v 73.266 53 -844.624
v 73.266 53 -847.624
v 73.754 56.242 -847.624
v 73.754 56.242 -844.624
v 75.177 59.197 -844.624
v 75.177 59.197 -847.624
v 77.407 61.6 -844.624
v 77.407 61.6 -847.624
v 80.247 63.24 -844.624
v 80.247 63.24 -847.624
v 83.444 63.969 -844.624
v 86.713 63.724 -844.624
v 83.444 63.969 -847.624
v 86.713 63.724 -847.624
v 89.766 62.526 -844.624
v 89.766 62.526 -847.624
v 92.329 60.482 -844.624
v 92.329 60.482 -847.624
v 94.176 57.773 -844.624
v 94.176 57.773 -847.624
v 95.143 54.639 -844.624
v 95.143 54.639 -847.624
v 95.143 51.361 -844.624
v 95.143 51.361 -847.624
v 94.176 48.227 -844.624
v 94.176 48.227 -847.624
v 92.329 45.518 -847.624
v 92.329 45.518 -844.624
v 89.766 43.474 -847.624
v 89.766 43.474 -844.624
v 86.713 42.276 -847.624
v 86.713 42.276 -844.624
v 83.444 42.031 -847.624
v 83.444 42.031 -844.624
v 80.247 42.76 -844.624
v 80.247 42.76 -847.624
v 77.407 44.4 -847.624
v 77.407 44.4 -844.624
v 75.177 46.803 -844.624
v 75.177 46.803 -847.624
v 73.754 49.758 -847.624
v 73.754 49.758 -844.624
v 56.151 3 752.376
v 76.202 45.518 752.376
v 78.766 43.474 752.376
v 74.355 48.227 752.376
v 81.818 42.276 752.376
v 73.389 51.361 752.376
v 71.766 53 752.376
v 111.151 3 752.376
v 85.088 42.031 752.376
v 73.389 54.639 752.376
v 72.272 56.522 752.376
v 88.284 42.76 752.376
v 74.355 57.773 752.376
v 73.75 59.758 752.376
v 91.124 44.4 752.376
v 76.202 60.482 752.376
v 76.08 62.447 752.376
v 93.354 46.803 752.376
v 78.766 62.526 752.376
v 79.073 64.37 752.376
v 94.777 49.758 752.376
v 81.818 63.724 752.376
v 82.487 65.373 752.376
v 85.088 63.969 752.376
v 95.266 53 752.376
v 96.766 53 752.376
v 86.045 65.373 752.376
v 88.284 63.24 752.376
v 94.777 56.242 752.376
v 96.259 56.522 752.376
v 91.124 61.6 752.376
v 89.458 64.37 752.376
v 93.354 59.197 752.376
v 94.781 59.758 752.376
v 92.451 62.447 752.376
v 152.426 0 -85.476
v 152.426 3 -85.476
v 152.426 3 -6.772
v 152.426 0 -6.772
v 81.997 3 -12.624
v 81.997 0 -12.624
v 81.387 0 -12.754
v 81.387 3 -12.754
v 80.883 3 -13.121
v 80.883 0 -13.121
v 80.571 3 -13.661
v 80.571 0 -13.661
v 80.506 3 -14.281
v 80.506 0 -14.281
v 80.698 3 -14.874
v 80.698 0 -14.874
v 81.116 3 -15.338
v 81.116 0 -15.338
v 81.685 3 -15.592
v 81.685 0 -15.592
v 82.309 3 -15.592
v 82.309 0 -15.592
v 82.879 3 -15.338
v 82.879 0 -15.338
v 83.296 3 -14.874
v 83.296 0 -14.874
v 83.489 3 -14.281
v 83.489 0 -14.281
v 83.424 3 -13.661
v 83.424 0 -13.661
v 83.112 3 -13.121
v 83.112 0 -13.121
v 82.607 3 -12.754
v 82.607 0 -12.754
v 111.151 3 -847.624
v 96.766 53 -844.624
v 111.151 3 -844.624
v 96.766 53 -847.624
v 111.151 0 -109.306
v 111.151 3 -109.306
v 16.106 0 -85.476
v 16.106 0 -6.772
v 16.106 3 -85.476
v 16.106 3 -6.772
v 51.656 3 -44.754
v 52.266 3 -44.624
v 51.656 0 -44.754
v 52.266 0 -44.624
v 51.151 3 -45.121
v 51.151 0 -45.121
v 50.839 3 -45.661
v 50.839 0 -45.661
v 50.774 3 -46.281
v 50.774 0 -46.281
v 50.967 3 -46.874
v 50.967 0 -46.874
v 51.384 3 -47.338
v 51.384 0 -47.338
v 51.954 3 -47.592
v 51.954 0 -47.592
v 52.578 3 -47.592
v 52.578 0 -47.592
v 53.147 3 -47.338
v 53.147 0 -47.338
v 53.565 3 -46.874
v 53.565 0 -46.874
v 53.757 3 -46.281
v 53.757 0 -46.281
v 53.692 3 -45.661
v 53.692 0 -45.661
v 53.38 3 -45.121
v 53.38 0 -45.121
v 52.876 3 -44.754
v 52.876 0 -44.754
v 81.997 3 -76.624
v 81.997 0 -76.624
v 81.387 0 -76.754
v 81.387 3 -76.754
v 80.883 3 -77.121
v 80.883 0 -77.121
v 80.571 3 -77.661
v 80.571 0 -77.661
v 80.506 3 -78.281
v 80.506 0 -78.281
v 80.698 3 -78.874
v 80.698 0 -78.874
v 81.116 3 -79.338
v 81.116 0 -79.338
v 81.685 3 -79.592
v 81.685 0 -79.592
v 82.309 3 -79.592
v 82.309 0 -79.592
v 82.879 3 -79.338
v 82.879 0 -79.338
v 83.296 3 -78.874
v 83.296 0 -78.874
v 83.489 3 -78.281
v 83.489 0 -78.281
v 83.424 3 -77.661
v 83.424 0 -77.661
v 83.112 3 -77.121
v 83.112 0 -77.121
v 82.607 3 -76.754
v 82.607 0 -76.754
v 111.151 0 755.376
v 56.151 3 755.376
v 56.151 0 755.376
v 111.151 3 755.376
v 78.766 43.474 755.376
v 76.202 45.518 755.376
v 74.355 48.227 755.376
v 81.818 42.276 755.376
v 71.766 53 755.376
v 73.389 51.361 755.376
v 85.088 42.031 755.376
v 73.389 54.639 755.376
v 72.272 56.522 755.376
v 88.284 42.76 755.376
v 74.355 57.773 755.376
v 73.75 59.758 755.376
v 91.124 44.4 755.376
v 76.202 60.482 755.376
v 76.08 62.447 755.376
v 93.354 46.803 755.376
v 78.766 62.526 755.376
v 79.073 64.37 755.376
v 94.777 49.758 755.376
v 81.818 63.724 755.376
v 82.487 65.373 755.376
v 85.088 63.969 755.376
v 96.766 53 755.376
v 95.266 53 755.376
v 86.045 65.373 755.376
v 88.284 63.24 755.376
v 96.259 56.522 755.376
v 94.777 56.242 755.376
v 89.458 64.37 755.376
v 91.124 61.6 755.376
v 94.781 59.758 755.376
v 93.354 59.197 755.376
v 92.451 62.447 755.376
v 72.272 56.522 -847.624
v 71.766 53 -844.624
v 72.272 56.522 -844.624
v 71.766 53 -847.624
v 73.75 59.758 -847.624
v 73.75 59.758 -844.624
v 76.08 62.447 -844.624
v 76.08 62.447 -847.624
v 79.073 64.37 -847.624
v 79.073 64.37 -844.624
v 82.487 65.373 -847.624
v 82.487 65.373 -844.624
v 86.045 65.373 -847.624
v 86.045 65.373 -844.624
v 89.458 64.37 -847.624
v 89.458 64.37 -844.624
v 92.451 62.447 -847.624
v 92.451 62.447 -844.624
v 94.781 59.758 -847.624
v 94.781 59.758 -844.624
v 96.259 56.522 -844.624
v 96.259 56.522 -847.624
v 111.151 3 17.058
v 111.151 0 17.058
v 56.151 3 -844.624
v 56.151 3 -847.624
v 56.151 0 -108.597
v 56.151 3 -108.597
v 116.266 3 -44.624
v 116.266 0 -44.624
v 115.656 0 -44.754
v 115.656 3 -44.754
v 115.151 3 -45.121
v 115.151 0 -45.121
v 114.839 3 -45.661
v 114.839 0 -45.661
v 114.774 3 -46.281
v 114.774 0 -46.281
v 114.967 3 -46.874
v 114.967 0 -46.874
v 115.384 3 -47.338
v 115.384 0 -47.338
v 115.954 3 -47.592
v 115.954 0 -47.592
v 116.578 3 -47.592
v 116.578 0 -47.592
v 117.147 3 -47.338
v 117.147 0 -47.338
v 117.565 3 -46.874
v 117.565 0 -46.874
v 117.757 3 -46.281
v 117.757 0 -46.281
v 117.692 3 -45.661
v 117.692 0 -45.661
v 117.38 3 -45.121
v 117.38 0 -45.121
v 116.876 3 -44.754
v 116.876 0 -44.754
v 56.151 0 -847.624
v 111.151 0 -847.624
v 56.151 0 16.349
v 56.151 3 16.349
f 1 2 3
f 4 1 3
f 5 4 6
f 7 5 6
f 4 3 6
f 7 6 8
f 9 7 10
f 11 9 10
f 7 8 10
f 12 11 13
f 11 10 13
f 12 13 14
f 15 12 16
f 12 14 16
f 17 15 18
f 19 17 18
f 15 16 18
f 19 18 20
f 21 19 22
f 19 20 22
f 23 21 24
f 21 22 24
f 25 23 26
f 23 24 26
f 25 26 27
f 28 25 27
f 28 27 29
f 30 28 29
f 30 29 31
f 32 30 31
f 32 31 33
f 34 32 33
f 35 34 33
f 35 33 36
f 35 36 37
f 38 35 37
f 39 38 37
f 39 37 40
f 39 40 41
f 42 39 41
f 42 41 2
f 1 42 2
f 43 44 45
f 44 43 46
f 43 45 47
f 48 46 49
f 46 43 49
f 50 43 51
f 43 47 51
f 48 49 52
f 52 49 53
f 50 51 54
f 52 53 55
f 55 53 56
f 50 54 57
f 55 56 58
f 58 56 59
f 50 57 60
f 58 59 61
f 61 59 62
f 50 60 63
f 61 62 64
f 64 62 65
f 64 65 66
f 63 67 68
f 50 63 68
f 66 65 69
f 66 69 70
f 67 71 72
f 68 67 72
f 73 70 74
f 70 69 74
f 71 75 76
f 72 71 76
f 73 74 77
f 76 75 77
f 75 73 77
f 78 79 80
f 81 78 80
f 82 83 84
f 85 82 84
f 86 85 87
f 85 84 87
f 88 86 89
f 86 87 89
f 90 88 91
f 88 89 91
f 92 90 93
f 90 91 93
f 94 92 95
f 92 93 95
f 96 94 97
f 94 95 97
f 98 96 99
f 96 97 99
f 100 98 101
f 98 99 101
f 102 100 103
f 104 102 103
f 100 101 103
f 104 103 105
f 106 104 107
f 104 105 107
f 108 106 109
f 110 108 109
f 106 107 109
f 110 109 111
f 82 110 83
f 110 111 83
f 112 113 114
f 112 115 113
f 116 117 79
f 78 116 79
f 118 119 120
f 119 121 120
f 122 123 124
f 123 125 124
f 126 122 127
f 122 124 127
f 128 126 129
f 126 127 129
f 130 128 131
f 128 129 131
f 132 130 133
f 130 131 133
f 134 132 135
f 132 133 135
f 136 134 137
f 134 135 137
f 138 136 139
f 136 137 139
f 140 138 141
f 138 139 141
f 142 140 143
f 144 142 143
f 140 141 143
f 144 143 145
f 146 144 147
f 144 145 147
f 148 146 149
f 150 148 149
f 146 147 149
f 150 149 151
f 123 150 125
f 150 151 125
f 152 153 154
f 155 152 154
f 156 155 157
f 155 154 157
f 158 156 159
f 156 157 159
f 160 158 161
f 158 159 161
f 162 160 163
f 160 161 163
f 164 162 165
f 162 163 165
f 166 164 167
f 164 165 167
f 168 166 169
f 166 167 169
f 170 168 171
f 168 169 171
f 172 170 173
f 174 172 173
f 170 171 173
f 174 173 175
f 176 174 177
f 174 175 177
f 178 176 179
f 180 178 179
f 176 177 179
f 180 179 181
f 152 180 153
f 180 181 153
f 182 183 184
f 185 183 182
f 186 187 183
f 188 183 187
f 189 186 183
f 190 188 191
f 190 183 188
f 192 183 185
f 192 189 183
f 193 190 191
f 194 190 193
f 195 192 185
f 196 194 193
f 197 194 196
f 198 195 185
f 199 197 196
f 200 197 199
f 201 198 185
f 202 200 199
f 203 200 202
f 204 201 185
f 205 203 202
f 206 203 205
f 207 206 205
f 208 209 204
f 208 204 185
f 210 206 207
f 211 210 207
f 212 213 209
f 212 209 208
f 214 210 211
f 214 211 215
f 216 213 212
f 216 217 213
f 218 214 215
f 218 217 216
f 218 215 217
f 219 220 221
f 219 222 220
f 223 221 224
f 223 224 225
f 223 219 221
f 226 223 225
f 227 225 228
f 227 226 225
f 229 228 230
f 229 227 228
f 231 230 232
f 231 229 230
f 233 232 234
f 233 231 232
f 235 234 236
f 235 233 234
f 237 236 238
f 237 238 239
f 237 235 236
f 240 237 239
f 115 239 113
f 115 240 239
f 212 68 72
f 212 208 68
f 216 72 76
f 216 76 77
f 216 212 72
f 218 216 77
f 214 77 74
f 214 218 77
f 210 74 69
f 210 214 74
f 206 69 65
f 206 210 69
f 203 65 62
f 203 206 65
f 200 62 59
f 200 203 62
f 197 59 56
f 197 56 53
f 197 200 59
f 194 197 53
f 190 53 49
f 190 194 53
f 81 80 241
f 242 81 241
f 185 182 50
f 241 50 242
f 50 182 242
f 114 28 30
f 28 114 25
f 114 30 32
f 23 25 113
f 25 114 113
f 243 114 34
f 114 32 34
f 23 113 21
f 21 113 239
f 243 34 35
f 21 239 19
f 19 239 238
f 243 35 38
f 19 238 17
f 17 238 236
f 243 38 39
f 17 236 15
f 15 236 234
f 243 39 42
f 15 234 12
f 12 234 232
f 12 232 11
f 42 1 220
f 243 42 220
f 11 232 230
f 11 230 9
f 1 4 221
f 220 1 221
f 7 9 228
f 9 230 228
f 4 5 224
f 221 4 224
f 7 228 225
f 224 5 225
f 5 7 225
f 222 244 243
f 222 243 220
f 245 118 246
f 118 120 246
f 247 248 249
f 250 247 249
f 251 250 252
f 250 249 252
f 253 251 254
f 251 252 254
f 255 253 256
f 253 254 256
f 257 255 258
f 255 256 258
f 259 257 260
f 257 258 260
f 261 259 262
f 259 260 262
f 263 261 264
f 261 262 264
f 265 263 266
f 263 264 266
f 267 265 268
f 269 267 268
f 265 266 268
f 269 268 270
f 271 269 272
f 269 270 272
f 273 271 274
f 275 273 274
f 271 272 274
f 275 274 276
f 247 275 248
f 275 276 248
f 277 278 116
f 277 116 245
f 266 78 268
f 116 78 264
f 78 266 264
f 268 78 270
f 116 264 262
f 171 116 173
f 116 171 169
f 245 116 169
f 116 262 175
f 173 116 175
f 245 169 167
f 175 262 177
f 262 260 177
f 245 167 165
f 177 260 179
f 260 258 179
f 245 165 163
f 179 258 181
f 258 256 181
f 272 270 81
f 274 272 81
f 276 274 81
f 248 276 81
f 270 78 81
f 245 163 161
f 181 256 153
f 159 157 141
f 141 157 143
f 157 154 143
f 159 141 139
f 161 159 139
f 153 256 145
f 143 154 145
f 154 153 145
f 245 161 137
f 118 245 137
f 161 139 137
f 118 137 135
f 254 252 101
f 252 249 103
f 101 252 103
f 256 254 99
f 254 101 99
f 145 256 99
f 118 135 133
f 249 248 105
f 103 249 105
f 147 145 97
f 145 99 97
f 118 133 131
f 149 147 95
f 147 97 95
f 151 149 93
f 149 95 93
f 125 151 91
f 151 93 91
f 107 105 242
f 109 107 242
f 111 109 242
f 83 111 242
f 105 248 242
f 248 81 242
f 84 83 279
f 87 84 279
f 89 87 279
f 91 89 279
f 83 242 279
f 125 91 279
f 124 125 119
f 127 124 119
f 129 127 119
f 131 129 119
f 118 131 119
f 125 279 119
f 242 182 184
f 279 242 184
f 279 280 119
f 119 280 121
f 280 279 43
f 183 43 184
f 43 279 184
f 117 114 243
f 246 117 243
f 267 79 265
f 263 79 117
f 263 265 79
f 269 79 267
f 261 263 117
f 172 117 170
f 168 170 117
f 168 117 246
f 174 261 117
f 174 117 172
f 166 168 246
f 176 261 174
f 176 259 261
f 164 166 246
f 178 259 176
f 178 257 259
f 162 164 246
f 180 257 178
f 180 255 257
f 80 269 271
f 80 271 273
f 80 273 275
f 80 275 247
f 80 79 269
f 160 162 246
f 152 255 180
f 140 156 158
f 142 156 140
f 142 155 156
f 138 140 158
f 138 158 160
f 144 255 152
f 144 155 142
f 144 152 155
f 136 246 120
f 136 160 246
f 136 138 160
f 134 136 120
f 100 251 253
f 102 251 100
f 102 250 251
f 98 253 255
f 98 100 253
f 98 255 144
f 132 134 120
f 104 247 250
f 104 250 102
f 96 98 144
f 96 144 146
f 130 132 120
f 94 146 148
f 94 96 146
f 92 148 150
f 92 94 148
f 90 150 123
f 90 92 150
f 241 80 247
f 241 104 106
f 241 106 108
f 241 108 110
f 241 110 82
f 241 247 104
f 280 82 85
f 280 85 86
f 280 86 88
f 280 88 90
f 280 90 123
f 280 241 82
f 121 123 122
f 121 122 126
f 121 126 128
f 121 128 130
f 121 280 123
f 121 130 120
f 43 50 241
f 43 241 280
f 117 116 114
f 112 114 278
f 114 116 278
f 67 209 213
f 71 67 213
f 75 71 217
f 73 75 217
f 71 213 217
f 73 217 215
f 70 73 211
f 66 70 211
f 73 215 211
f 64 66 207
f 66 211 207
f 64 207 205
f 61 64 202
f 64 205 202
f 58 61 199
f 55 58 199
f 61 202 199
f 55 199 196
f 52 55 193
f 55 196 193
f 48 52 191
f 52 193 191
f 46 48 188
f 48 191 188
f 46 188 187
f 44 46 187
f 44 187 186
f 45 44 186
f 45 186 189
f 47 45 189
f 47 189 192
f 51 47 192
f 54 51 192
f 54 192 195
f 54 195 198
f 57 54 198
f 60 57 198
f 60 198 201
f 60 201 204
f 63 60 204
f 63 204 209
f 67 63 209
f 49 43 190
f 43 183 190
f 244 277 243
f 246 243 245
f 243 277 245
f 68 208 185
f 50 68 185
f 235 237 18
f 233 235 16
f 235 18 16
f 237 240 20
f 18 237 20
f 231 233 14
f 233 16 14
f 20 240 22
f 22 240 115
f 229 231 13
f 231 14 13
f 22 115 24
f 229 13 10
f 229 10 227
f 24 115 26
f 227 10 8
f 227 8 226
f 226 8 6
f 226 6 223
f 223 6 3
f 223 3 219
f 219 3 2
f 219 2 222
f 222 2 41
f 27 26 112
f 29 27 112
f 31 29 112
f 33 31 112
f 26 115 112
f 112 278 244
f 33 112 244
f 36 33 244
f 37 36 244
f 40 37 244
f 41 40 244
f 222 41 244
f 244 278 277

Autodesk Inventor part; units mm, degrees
ref_plane "YZ Plane" through (0, 0, 0) normal (1, 0, 0) x (0, 1, 0)
ref_plane "XZ Plane" through (0, 0, 0) normal (0, 1, 0) x (-1, 0, 0)
ref_plane "XY Plane" through (0, 0, 0) normal (0, 0, 1) x (1, 0, 0)
sketch "Esboço1" plane through (0, 0, 0) normal (0, 1, 0) x (-1, 0, 0)
  line L0 (-56.1514, 755.3759) -> (-111.1514, 755.3759)
  line L1 (-111.1514, 755.3759) -> (-111.1514, -847.6241)
  line L2 (-111.1514, -847.6241) -> (-56.1514, -847.6241)
  line L3 (-56.1514, -847.6241) -> (-56.1514, 755.3759)
  point P0 (0, 0)
  dimension "d0" = 1603
  dimension "d1" = 55
extrude "Extrusão1" add sketch "Esboço1" along normal blind 3
sketch "Esboço2" plane through (56.1514, 0, 755.3759) normal (0, 0, 1) x (1, 0, 0)
  circle A0 centre (28.1143, 53) radius 12.5
  circle A1 centre (28.1143, 53) radius 11
  line L0 (55, 3) -> (0, 3) projected
  line L1 (0, 3) -> (15.6143, 53)
  line L2 (40.6143, 53) -> (55, 3)
  point P0 (-56.1514, 0)
  point P1 (17.1143, 53)
  point P2 (39.1143, 53)
  dimension "d4" = 25
  dimension "d5" = 22
  dimension "d8" = 50
extrude "Extrusão2" add sketch "Esboço2" against normal blind 3 contours L2 L0 L1 A0
sketch "Esboço4" plane through (111.1514, 0, -847.6241) normal (0, 0, -1) x (-1, 0, 0)
  arc A0 (39.3857, 53) -> (14.3857, 53) centre (26.8857, 53) ccw projected
  line L0 (0, 3) -> (55, 3)
  circle A1 centre (26.8857, 53) radius 11
  circle A2 centre (26.8857, 53) radius 12.5
  line L1 (14.3857, 53) -> (0, 3)
  line L2 (55, 3) -> (39.3857, 53)
  point P0 (111.1514, 0)
  dimension "d40" = 22
extrude "Extrusão3" add sketch "Esboço4" against normal blind 3
sketch "Esboço5" plane through (0, 3, 0) normal (0, 1, 0) x (1, 0, 0)
  line L0 (56.1514, -749.3759) -> (95.2658, -749.3759) projected
  line L1 (111.1514, 844.6241) -> (56.1514, 844.6241) projected
  line L2 (56.1514, 847.6241) -> (56.1514, -755.3759) projected
  circle A0 centre (-124.6549, -214.6876) radius 2
  circle A1 centre (-96.9649, -152.5807) radius 2
  line L3 (16.1057, 85.4763) -> (84.2658, 124.8286)
  line L4 (84.2658, 124.8286) -> (152.4258, 85.4763)
  line L5 (152.4258, 85.4763) -> (152.4258, 6.7718)
  line L6 (152.4258, 6.7718) -> (84.2658, -32.5804)
  line L7 (84.2658, -32.5804) -> (16.1057, 6.7718)
  line L8 (16.1057, 6.7718) -> (16.1057, 85.4763)
  line L9 (56.1514, 847.6241) -> (56.1514, -755.3759) projected
  line L10 (111.1514, -755.3759) -> (111.1514, 847.6241) projected
  line L11 (56.1514, -755.3759) -> (111.1514, -755.3759)
  line L12 (111.1514, -755.3759) -> (111.1514, 847.6241)
  line L13 (111.1514, 847.6241) -> (56.1514, 847.6241)
  line L14 (56.1514, 847.6241) -> (56.1514, -755.3759)
  line L15 (95.2658, -755.3759) -> (95.2658, -755.3759) projected
  line L16 (90.2658, 847.6241) -> (78.2658, 847.6241) projected
  line L17 (95.2658, -752.3759) -> (95.2658, -752.3759) projected
  point P0 (111.1514, 841.6241)
  point P1 (56.1514, 841.6241)
  point P2 (84.2658, 46.1241)
  point P3 (73.2658, -755.3759)
  point P4 (73.2658, -755.3759)
  point P5 (84.2658, -755.3759)
  point P6 (84.2658, 847.6241)
  point P7 (84.2658, 847.6241)
  point P8 (73.2658, -752.3759)
  point P9 (84.2658, -752.3759)
  point P10 (111.1514, 109.3061)
  point P11 (111.1514, -17.058)
  point P12 (56.1514, -16.3486)
  point P13 (56.1514, 108.5967)
  dimension "d13" = 4
  dimension "d14" = 4
  dimension "d15" = 68
  dimension "d20" = 722.7955
  dimension "d22" = 722.7955
  dimension "d25" = 0
extrude "Extrusão4" add sketch "Esboço5" against normal blind 3 contours L4 L5 L6 L10 | L2 L7 L8 L3
sketch "Esboço6" plane through (0, 3, 0) normal (0, 1, 0) x (1, 0, 0)
  circle A0 centre (116.2657, 46.1244) radius 1.5
  circle A1 centre (52.2657, 46.1244) radius 1.5
  line L0 (16.1057, 85.4763) -> (16.1057, 6.7718) projected
  line L1 (152.4258, 6.7718) -> (152.4258, 85.4763) projected
  circle A2 centre (81.9973, 14.1244) radius 1.5
  circle A3 centre (81.9973, 78.1244) radius 1.5
  point P0 (0, 0)
  point P1 (56.1514, -16.3486)
  point P2 (56.1514, 108.5967)
  dimension "d28" = 3
  dimension "d29" = 3
  dimension "d30" = 64
  dimension "d31" = 36.16
  dimension "d43" = 3
  dimension "d44" = 3
  dimension "d45" = 64
  dimension "d46" = 32
  dimension "d47" = 32
  dimension "d48" = 36.1602
  dimension "d49" = 62.473
hole "Furo1" at (52.2657, 3, -46.1244) at (116.2657, 3, -46.1244) at (81.9973, 3, -14.1244) at (81.9973, 3, -78.1244) direction (0, -1, 0) diameter 3 depth 20 tip angle 118
extrude "Extrusão5" add sketch "Esboço2" against normal blind 3 contours A0
properties part number "Suporte Central Atualizado"
